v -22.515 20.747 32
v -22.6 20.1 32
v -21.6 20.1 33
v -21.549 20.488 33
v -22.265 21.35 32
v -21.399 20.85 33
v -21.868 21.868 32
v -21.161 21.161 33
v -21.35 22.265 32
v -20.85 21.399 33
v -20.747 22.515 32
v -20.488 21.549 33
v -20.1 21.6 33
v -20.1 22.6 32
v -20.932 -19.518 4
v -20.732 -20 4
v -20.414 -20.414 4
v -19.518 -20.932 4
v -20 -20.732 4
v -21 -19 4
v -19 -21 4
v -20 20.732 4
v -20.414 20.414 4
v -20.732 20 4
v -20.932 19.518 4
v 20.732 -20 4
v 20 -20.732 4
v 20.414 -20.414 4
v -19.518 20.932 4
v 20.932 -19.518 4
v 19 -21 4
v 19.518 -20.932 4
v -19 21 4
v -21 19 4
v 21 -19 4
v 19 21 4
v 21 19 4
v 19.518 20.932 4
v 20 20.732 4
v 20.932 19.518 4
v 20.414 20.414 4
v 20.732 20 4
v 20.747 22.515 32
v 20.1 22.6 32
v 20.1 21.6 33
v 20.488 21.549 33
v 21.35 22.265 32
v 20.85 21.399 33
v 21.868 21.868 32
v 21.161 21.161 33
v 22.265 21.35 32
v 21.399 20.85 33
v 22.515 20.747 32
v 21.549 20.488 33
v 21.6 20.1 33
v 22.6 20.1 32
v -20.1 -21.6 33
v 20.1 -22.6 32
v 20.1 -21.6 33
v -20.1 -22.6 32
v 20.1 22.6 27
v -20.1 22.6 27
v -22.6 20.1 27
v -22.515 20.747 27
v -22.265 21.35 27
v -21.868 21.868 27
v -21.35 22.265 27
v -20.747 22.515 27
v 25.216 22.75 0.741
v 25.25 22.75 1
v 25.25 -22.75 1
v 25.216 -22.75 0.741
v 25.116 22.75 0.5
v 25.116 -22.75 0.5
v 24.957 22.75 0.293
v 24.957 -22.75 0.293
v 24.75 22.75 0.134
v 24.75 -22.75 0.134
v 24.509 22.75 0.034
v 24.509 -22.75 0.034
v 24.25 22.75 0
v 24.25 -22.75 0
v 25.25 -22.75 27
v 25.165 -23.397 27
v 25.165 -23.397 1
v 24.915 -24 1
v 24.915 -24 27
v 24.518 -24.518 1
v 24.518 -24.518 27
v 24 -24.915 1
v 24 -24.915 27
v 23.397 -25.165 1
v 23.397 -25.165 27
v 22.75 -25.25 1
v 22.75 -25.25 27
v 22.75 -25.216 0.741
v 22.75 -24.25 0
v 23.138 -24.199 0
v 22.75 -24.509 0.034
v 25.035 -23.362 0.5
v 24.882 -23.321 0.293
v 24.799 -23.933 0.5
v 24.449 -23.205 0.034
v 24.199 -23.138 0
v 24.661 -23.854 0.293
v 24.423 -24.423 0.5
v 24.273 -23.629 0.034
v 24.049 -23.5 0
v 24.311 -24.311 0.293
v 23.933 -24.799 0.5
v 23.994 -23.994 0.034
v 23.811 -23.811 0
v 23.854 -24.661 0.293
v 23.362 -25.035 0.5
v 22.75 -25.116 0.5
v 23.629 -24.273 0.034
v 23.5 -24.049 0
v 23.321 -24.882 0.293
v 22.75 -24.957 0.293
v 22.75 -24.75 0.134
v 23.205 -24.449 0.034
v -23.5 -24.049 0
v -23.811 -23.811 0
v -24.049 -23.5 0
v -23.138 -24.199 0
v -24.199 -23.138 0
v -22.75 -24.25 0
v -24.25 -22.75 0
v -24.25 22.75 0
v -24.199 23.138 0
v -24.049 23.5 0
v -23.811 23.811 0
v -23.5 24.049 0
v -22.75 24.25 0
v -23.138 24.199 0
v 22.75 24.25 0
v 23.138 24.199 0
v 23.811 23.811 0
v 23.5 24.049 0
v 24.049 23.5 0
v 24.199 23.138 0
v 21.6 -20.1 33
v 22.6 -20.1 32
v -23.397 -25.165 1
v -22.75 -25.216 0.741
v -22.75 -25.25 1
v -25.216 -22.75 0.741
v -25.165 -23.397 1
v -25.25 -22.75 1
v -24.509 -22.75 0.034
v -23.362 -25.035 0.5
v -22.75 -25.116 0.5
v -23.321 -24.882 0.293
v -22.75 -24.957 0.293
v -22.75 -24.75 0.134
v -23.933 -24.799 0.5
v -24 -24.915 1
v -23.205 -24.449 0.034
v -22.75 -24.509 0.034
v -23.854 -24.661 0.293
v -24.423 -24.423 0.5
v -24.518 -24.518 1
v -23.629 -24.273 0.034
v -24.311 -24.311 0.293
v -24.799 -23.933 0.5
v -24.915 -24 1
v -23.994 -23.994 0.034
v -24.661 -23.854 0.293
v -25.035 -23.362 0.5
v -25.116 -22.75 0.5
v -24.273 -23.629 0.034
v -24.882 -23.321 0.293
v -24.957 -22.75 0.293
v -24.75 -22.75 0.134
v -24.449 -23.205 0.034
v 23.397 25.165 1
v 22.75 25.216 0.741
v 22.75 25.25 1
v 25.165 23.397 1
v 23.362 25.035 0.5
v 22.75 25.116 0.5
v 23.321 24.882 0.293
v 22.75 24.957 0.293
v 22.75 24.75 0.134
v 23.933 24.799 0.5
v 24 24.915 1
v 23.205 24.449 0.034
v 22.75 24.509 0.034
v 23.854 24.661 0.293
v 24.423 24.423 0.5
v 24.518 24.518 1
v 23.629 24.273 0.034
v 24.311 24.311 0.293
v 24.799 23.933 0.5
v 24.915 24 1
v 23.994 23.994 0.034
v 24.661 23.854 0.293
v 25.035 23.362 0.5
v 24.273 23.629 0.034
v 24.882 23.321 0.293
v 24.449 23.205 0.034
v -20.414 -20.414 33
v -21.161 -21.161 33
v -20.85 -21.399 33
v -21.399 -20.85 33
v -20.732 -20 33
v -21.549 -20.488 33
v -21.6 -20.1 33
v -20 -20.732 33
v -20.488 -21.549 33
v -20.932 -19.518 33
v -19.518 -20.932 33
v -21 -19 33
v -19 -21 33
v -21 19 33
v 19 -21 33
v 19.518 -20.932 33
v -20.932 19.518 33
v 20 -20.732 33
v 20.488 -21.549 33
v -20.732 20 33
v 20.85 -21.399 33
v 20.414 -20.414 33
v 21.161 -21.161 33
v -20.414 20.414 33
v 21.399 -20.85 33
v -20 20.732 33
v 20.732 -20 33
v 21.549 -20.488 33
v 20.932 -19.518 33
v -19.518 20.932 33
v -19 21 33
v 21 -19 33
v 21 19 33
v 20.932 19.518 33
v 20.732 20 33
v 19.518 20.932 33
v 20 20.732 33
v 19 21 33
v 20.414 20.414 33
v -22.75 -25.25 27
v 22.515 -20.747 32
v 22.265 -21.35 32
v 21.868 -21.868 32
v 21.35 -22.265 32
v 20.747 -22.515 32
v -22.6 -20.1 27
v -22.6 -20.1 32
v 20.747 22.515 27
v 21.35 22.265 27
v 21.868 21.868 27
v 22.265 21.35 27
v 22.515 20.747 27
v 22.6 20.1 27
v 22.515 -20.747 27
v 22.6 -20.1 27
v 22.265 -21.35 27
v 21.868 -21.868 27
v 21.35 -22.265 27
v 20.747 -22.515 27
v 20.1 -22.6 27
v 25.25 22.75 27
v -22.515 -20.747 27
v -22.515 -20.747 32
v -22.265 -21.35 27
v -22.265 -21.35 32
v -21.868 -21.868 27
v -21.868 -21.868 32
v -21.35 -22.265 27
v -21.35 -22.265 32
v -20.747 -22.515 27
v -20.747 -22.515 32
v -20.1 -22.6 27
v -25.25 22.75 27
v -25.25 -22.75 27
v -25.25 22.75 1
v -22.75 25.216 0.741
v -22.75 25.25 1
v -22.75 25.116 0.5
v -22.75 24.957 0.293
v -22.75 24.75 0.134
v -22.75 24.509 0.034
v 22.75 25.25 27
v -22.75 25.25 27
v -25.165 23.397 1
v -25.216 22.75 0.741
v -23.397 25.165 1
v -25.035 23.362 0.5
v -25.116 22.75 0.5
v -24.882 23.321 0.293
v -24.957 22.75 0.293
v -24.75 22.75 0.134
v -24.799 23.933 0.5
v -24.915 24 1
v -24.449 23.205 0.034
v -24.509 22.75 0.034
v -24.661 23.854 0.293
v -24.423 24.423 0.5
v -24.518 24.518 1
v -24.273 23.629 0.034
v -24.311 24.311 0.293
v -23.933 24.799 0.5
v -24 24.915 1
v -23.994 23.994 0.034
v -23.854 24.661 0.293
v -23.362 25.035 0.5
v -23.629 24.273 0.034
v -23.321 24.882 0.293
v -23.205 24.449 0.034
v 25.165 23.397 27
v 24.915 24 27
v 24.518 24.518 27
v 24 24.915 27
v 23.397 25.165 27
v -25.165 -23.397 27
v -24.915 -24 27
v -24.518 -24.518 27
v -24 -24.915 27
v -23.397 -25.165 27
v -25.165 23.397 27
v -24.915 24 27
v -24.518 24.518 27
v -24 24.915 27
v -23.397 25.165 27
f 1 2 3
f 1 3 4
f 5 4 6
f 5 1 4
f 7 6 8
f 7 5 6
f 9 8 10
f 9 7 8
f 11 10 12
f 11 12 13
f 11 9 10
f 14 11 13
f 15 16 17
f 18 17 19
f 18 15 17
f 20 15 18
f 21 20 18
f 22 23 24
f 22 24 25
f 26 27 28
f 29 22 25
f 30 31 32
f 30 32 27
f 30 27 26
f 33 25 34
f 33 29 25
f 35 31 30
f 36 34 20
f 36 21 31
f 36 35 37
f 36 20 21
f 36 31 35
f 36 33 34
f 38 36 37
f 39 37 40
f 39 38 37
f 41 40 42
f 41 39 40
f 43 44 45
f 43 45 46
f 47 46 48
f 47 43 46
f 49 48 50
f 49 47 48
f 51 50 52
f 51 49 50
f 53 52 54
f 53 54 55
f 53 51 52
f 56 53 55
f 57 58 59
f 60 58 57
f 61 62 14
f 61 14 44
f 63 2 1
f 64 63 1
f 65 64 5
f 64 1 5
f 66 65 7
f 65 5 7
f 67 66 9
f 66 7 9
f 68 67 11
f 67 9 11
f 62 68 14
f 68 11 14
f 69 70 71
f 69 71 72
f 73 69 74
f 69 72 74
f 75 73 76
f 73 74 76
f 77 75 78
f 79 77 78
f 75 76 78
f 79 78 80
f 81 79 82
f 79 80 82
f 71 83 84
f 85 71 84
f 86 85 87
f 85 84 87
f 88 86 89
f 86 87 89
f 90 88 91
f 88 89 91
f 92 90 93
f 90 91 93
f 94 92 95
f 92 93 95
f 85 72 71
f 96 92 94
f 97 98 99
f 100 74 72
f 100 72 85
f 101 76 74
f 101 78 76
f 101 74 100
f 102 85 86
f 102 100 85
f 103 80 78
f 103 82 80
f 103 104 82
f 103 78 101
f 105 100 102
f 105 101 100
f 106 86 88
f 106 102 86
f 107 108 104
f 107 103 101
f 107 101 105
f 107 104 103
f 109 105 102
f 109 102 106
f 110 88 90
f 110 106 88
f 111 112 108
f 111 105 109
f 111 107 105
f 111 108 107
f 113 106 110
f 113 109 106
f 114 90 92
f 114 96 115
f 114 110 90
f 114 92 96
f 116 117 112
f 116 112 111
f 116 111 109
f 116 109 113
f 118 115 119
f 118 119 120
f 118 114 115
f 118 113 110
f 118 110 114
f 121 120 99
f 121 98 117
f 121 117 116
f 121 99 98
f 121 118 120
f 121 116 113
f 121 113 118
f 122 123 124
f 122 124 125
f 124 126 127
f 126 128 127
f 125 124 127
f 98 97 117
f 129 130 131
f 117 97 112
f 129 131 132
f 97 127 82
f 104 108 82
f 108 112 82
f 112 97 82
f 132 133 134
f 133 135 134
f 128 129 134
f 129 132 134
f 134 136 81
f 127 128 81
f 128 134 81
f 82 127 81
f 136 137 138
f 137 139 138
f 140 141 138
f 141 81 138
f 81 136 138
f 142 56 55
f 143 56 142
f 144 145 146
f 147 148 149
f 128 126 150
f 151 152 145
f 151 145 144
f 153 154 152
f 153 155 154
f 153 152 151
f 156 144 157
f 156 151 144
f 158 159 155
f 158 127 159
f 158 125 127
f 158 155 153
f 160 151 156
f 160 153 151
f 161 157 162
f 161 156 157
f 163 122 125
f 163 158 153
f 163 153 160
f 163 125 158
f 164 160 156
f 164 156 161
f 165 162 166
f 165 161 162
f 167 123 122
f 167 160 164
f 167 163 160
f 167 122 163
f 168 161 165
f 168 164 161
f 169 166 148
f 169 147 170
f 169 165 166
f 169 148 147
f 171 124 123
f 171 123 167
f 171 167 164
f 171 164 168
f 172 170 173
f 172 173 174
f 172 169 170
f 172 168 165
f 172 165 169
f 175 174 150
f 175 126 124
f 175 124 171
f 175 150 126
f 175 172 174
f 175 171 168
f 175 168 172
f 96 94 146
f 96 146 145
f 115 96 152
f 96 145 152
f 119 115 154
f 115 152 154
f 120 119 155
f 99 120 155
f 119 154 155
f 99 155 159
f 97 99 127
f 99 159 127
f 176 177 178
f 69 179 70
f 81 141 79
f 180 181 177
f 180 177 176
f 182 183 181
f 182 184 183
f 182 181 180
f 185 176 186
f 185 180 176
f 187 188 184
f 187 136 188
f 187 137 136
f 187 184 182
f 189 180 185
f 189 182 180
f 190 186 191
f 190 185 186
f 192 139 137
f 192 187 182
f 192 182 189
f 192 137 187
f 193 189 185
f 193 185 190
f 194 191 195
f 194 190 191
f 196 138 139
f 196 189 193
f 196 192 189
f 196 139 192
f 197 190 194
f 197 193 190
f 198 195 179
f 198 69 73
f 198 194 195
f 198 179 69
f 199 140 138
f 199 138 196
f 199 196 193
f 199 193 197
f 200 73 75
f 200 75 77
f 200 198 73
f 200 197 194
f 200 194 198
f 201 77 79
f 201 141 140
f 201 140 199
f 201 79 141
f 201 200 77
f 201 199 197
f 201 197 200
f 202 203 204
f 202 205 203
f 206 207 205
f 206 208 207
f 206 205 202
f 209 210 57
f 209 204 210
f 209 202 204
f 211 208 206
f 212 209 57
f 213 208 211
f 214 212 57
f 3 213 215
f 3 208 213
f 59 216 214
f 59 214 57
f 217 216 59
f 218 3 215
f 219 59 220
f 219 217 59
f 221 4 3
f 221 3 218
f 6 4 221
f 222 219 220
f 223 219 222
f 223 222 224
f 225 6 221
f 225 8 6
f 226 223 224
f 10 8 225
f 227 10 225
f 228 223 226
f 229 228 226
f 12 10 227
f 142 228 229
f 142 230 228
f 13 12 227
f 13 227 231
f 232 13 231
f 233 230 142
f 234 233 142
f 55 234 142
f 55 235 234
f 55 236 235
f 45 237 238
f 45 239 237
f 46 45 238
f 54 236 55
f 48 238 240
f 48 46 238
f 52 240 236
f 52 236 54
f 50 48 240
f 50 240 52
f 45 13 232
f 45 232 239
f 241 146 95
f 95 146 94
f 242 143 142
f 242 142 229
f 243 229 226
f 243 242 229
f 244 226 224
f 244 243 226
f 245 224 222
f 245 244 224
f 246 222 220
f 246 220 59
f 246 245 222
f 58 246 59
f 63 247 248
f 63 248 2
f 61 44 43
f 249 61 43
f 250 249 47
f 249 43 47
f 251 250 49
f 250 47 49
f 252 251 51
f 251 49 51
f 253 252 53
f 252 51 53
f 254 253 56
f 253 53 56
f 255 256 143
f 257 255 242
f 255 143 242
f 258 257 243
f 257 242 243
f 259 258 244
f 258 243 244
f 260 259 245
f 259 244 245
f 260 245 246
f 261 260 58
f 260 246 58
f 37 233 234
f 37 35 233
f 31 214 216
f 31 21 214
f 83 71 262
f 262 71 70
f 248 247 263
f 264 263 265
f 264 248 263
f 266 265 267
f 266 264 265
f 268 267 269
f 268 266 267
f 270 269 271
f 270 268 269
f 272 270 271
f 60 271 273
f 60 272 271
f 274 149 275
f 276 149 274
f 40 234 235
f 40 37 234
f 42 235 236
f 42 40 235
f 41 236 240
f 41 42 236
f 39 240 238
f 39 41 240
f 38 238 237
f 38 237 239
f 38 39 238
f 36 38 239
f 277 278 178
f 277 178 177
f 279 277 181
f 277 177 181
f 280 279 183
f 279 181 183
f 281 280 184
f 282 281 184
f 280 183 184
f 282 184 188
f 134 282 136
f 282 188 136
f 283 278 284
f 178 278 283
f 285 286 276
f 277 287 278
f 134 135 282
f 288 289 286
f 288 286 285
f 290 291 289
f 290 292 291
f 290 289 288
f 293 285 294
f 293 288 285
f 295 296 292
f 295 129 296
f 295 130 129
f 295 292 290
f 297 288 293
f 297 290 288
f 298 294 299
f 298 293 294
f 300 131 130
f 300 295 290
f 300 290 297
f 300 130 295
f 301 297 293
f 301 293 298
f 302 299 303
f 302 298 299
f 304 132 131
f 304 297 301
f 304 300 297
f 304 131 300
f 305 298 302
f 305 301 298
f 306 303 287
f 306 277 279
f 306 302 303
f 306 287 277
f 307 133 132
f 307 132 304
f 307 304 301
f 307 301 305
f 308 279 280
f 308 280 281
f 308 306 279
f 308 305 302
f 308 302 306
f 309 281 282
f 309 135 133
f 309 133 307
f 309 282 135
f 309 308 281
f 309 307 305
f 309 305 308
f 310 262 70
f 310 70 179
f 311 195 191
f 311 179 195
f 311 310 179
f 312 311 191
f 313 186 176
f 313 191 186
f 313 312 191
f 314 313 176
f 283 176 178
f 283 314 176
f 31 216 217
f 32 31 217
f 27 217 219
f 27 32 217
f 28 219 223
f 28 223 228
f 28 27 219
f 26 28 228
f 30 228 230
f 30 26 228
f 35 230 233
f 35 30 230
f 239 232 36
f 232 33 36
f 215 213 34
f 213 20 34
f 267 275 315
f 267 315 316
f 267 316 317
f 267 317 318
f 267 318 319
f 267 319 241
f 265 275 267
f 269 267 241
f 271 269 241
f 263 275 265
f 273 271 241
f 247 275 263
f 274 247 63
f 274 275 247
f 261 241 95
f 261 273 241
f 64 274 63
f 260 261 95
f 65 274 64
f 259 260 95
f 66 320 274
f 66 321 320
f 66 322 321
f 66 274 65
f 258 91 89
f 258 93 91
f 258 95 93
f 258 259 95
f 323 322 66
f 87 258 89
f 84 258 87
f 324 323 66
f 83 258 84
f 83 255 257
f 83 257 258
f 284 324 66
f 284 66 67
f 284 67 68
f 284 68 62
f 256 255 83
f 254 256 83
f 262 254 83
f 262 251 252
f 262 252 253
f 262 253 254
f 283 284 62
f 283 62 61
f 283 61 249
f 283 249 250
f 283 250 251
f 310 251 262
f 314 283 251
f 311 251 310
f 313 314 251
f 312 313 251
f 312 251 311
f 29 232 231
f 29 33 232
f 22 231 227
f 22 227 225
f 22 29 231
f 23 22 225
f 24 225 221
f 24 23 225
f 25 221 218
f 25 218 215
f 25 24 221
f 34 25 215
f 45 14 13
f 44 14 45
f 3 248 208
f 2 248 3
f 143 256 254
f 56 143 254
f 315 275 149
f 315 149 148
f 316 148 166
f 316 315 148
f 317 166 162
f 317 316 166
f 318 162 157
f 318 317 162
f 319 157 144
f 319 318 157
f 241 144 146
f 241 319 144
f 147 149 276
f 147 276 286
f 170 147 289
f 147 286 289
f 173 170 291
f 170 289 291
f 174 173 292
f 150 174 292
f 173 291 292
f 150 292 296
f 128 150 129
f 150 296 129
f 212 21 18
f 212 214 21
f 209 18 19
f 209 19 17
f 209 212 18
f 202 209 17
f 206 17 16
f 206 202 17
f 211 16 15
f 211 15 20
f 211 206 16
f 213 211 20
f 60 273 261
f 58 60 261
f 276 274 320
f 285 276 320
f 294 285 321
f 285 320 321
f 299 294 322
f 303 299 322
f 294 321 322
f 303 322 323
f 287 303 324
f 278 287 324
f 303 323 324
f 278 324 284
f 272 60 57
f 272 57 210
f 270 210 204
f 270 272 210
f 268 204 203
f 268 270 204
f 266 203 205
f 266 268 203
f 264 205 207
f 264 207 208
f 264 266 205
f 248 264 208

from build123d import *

# Parameters (mm, degrees)
F0_W          = 50.5
F0_H          = 50.5
F1_DEPTH      = 27
F2_W          = 45.2
F2_H          = 45.2
F3_DEPTH      = 6
F4_W          = 42
F4_H          = 42
F5_DEPTH      = 6
F5_DEPTH_BACK = 23
F6_R          = 2.5
F7_R          = 2
F8_SIZE       = 1
F9_R          = 1


with BuildPart() as f1:
    # F0 (on Top) → F1 (new body)
    with BuildSketch(Plane.XY):
        Rectangle(F0_W, F0_H)
    extrude(amount=F1_DEPTH)

    # F2 (on face) → F3 (join)
    with BuildSketch(Plane.XY.offset(27)):
        Rectangle(F2_W, F2_H)
    extrude(amount=F3_DEPTH)

    # F4 (on face) → F5 (cut, two sides)
    with BuildSketch(Plane.XY.offset(27)) as f5_sk:
        Rectangle(F4_W, F4_H)
    extrude(amount=F5_DEPTH, mode=Mode.SUBTRACT)
    extrude(f5_sk.sketch, amount=-F5_DEPTH_BACK, mode=Mode.SUBTRACT)

    # F6
    f6_edges = [f1.edges().sort_by_distance(p)[0] for p in [
        (-25.25, 25.25, 13.5),
        (-25.25, -25.25, 13.5),
        (25.25, -25.25, 13.5),
        (25.25, 25.25, 13.5),
        (-22.6, 22.6, 30),
        (-22.6, -22.6, 30),
        (22.6, -22.6, 30),
        (22.6, 22.6, 30),
    ]]
    fillet(f6_edges, radius=F6_R)

    # F7
    f7_edges = [f1.edges().sort_by_distance(p)[0] for p in [
        (-21, 21, 18.5),
        (21, 21, 18.5),
        (21, -21, 18.5),
        (-21, -21, 18.5),
    ]]
    fillet(f7_edges, radius=F7_R)

    # F8
    f8_edges = [f1.edges().sort_by_distance(p)[0] for p in [
        (-22.6, 0, 33),
    ]]
    chamfer(f8_edges, length=F8_SIZE)

    # F9
    f9_edges = [f1.edges().sort_by_distance(p)[0] for p in [
        (0, 25.25, 0),
    ]]
    fillet(f9_edges, radius=F9_R)


solid = f1.part
